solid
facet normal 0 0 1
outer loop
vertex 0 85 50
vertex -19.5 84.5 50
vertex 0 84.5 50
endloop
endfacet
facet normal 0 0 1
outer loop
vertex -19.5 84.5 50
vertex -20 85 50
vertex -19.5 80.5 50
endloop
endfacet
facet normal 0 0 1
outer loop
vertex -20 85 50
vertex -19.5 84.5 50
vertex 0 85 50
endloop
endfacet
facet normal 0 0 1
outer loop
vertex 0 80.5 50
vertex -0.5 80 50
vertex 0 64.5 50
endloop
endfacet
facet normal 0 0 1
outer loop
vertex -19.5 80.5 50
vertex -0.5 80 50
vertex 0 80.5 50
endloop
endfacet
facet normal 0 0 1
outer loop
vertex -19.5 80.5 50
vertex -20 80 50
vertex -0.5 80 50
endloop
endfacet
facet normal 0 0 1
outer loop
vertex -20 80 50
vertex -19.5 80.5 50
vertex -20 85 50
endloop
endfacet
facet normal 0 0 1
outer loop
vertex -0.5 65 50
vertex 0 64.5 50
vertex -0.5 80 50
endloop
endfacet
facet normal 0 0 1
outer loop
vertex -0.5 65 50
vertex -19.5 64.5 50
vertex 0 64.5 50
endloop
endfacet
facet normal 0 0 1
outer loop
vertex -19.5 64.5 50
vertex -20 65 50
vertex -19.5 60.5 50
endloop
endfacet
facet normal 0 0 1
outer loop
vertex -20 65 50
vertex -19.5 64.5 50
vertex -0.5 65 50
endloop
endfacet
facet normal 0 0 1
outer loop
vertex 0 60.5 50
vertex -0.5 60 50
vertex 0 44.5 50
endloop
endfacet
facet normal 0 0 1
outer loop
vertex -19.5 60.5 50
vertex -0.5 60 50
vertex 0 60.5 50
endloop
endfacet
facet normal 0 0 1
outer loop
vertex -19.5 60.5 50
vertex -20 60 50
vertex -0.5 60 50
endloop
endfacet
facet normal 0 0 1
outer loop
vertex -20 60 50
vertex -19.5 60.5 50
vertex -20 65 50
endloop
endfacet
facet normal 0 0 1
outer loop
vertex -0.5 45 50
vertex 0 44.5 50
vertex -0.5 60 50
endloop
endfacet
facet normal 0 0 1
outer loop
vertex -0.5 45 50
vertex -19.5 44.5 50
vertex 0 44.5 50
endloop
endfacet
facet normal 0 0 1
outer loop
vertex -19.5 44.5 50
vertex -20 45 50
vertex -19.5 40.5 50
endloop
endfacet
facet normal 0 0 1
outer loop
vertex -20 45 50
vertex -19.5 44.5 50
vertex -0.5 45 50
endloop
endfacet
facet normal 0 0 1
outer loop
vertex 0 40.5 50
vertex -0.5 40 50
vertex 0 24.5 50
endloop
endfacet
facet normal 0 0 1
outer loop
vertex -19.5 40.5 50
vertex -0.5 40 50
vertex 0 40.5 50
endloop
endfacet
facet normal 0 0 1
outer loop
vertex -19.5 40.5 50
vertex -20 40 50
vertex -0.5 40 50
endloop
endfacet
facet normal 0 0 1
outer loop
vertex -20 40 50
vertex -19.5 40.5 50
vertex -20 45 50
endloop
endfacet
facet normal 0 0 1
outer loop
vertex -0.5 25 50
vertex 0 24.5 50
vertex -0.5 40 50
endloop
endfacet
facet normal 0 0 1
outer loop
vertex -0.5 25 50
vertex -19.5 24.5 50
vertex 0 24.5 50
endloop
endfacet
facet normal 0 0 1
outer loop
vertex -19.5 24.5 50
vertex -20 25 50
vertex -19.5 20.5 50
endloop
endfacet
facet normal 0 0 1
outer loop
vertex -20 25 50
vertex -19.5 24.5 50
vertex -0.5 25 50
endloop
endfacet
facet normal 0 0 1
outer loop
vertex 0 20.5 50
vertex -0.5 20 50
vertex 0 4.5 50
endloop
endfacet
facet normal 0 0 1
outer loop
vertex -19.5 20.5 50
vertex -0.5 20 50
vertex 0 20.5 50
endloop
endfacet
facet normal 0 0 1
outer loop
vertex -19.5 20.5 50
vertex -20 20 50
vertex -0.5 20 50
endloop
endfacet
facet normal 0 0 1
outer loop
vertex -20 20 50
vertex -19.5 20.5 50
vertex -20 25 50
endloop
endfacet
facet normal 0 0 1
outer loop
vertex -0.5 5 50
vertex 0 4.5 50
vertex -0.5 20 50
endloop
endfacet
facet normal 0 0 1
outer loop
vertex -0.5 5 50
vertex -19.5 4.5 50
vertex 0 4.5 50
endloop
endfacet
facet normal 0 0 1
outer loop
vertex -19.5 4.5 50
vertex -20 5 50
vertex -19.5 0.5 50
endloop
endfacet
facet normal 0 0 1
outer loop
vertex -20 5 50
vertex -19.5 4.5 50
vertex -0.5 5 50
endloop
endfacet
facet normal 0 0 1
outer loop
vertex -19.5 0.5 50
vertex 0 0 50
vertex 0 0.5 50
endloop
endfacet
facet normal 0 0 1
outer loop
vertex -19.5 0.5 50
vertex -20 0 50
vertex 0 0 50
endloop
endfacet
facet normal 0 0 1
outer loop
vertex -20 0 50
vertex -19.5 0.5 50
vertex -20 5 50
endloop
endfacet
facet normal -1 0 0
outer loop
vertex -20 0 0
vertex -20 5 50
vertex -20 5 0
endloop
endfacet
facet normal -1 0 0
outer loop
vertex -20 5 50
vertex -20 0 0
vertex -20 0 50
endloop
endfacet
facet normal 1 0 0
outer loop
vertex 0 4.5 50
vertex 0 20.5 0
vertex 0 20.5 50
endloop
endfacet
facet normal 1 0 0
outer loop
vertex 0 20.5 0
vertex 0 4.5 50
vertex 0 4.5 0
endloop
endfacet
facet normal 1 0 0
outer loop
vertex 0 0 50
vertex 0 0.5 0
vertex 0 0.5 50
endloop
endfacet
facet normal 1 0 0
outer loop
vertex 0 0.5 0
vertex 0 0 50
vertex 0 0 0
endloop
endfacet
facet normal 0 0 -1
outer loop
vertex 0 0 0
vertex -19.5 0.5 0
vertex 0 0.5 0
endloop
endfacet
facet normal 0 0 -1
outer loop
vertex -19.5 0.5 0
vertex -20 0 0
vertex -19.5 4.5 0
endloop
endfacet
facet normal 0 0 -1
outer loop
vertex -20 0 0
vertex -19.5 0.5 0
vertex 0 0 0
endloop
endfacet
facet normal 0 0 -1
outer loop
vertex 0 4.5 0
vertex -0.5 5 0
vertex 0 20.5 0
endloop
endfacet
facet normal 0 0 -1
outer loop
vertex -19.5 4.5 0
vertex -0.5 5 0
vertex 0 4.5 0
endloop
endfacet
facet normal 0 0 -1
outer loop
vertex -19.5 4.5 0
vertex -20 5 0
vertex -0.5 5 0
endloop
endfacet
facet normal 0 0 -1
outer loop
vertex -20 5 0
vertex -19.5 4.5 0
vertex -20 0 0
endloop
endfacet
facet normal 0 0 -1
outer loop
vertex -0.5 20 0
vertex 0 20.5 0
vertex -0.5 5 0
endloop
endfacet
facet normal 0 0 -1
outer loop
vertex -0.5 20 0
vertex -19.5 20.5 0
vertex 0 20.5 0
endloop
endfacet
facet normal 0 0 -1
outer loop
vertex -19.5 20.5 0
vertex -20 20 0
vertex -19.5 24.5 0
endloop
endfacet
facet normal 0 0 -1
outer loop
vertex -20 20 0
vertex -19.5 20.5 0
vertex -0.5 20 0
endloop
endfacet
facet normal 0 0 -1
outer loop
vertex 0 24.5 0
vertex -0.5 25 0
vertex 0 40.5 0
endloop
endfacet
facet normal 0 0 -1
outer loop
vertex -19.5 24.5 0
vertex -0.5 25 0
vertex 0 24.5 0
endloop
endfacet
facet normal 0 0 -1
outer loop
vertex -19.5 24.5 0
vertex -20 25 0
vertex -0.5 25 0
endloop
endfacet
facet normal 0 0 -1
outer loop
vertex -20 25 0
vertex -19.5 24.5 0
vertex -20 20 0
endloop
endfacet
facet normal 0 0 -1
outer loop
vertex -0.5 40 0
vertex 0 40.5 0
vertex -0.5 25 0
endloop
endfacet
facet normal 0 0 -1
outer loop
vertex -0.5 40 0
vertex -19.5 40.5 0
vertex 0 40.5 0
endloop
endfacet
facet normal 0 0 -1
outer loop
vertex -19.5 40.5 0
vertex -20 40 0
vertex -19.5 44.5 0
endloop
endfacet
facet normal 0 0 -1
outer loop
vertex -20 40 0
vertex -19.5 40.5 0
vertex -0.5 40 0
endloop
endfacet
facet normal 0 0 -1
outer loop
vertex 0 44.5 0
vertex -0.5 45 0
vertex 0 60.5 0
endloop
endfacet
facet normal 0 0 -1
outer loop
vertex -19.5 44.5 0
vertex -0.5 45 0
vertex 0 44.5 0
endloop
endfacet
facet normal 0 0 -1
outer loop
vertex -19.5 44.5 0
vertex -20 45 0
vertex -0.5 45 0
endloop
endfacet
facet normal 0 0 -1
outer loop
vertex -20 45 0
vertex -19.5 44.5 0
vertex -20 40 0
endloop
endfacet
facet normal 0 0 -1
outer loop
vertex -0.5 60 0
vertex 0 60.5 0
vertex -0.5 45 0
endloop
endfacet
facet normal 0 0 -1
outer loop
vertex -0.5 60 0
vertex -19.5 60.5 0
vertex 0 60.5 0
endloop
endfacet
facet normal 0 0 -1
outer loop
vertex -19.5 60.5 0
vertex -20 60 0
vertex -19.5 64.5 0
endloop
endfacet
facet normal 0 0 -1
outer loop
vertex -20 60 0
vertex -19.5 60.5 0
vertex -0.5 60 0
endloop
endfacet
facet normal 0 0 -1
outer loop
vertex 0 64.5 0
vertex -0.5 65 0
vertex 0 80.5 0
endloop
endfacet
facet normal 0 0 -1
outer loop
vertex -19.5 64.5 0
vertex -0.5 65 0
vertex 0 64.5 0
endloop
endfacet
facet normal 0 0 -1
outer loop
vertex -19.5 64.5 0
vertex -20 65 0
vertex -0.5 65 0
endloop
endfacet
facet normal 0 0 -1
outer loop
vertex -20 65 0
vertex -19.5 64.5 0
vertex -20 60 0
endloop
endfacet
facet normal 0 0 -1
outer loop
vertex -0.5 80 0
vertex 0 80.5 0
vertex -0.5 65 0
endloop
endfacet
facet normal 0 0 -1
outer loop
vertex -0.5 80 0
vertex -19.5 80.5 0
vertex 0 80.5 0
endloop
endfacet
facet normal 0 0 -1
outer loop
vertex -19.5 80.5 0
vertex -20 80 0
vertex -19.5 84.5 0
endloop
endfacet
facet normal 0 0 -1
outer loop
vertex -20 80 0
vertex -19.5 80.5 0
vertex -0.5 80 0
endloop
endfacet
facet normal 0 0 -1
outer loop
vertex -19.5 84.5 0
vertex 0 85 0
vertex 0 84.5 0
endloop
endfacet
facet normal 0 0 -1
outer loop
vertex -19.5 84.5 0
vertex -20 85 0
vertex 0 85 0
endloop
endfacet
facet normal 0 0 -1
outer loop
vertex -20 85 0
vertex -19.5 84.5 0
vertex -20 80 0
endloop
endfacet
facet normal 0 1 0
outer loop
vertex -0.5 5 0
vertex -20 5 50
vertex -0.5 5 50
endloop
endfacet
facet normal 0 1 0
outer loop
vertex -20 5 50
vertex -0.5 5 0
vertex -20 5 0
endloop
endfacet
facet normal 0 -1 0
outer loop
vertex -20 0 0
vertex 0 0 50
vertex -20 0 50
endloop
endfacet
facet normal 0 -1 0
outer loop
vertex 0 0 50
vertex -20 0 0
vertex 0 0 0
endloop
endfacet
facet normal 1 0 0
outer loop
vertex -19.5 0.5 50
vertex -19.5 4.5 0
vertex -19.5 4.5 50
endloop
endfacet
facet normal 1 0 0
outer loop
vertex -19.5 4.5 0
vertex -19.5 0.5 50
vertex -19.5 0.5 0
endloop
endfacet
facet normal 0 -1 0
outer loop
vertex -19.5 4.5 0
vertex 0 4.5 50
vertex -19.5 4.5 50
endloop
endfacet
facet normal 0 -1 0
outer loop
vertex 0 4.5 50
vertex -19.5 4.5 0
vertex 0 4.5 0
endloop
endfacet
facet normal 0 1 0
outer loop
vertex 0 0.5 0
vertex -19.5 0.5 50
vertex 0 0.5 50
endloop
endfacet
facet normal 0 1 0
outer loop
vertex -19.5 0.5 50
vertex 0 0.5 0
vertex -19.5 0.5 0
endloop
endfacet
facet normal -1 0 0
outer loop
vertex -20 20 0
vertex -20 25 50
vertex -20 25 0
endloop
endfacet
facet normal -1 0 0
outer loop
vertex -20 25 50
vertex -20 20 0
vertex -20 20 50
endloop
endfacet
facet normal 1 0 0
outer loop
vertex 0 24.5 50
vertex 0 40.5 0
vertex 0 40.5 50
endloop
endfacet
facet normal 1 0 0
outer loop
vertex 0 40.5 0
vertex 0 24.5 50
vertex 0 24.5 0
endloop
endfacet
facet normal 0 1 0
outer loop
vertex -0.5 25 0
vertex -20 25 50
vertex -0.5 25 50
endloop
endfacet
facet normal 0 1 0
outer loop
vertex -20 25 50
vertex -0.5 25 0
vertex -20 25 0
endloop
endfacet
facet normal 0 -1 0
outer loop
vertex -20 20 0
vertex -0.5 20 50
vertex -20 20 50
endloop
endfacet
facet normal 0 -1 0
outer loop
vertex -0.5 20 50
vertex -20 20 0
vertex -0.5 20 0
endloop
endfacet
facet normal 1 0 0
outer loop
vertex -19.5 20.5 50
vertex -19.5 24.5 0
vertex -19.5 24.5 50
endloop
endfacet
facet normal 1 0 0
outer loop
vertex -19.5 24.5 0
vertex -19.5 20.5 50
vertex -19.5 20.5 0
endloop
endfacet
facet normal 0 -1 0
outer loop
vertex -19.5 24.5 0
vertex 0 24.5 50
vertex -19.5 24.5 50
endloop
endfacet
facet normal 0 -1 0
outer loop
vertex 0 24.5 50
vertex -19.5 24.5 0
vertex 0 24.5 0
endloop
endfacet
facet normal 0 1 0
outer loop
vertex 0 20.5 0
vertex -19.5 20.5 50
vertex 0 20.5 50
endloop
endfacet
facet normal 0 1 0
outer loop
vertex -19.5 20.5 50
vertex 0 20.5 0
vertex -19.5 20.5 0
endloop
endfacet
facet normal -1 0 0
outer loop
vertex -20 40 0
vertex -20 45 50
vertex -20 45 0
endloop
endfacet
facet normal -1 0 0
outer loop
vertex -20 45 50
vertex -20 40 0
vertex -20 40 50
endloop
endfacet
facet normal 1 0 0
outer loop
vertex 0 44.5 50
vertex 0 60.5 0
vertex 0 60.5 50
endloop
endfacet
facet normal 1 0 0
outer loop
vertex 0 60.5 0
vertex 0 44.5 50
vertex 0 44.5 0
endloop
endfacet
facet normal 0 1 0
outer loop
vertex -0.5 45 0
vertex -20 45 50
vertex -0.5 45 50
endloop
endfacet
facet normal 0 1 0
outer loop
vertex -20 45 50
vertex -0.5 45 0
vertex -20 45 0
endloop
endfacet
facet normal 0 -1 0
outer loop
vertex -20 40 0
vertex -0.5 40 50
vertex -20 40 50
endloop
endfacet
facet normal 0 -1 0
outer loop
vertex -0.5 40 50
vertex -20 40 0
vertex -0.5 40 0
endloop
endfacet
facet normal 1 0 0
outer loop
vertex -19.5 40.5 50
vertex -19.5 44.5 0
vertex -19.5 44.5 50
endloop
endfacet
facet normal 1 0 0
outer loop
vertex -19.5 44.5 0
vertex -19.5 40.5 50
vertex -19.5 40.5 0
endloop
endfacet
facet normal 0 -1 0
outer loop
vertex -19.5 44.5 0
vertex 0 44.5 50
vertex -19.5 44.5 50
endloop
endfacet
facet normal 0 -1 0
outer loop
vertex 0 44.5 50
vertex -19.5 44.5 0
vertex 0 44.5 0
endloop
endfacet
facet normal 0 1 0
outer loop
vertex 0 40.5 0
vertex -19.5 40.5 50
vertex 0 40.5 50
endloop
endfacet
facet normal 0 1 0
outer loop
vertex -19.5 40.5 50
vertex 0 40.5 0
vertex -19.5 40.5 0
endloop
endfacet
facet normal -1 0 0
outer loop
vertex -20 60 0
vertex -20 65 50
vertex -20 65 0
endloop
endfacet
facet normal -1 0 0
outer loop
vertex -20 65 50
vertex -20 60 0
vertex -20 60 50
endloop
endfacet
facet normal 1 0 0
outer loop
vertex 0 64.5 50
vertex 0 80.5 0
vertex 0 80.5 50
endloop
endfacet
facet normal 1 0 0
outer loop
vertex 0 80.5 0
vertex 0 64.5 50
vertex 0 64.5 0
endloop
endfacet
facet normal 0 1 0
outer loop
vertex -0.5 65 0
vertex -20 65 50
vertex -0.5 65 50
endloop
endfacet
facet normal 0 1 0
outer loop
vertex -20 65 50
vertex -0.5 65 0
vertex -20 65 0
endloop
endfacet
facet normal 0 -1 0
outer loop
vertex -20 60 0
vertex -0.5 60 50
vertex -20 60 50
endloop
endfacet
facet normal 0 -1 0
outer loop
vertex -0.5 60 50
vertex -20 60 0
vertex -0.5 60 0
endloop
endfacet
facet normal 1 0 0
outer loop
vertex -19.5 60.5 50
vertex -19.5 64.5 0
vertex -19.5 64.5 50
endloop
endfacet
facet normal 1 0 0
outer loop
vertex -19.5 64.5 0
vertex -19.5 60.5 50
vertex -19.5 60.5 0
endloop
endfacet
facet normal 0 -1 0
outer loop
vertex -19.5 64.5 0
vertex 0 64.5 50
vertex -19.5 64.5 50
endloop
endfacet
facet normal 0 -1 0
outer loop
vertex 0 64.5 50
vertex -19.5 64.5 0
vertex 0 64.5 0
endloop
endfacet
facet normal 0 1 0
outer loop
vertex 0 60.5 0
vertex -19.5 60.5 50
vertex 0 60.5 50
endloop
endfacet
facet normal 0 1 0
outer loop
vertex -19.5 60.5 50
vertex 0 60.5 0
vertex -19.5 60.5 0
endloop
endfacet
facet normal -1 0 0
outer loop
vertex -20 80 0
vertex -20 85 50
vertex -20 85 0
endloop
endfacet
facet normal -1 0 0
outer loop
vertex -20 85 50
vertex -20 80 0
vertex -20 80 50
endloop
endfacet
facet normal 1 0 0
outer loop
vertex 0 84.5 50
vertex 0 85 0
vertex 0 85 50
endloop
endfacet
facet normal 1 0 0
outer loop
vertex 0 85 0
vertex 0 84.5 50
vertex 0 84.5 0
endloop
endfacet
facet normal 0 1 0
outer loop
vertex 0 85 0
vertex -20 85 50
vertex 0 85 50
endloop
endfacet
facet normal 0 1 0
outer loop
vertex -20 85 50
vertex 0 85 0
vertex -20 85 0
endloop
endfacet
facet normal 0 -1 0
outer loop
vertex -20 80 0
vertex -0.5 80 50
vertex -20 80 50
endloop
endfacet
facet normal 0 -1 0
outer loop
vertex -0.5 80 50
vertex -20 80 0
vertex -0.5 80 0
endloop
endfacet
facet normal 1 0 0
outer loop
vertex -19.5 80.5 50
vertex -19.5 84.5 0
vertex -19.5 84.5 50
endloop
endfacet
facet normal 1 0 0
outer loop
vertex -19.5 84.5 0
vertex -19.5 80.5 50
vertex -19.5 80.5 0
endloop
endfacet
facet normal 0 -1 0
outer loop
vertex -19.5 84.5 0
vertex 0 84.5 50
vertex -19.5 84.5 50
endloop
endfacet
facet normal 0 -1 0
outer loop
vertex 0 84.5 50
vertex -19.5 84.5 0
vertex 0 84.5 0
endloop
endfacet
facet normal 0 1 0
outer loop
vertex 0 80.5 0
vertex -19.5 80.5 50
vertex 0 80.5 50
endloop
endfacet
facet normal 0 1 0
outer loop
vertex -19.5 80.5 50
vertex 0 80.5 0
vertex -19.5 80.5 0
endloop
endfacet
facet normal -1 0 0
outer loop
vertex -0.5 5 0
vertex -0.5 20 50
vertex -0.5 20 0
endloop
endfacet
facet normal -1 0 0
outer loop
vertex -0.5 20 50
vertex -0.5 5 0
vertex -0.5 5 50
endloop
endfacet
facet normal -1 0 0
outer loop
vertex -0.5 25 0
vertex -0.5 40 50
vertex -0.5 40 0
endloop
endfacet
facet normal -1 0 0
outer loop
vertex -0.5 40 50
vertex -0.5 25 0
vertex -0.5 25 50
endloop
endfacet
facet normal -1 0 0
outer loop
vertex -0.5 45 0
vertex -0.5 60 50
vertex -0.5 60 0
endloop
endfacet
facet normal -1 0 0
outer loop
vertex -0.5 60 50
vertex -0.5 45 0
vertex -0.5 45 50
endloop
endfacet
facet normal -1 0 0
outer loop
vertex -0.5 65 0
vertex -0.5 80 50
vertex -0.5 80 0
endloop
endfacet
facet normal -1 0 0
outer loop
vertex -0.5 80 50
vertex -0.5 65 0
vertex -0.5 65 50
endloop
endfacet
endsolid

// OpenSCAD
rotate([0,-90,0])
   basic(
      bridges= 5,
      height=20,
      deep = 50,
      walls = 0.5,
      clear=15,
      howmany = 4);


//module 
module basic(bridges= 10,
   height=20,
   deep = 50,
   walls = 0.5,
   clear=15,
   howmany = 4
   ) {   
   union() {
       for (j = [0:  howmany]) {
           translate([0, (clear+bridges) * j,0])
           bridge(deep=deep,
               width=bridges, 
               height=height, 
               walls=walls);
           if (j<howmany) {
               translate([0, bridges+ ((clear+bridges) *j),0])
               cube([deep, clear, walls]);
           }
       }
   }
}
    
module bridge(deep, width, height, walls) {
    difference(){
        cube([deep,width, height]);
        translate([-1,walls,-1])
        cube([deep+2, 
            width -(walls*2),
            height+1-walls]);
    }
}
